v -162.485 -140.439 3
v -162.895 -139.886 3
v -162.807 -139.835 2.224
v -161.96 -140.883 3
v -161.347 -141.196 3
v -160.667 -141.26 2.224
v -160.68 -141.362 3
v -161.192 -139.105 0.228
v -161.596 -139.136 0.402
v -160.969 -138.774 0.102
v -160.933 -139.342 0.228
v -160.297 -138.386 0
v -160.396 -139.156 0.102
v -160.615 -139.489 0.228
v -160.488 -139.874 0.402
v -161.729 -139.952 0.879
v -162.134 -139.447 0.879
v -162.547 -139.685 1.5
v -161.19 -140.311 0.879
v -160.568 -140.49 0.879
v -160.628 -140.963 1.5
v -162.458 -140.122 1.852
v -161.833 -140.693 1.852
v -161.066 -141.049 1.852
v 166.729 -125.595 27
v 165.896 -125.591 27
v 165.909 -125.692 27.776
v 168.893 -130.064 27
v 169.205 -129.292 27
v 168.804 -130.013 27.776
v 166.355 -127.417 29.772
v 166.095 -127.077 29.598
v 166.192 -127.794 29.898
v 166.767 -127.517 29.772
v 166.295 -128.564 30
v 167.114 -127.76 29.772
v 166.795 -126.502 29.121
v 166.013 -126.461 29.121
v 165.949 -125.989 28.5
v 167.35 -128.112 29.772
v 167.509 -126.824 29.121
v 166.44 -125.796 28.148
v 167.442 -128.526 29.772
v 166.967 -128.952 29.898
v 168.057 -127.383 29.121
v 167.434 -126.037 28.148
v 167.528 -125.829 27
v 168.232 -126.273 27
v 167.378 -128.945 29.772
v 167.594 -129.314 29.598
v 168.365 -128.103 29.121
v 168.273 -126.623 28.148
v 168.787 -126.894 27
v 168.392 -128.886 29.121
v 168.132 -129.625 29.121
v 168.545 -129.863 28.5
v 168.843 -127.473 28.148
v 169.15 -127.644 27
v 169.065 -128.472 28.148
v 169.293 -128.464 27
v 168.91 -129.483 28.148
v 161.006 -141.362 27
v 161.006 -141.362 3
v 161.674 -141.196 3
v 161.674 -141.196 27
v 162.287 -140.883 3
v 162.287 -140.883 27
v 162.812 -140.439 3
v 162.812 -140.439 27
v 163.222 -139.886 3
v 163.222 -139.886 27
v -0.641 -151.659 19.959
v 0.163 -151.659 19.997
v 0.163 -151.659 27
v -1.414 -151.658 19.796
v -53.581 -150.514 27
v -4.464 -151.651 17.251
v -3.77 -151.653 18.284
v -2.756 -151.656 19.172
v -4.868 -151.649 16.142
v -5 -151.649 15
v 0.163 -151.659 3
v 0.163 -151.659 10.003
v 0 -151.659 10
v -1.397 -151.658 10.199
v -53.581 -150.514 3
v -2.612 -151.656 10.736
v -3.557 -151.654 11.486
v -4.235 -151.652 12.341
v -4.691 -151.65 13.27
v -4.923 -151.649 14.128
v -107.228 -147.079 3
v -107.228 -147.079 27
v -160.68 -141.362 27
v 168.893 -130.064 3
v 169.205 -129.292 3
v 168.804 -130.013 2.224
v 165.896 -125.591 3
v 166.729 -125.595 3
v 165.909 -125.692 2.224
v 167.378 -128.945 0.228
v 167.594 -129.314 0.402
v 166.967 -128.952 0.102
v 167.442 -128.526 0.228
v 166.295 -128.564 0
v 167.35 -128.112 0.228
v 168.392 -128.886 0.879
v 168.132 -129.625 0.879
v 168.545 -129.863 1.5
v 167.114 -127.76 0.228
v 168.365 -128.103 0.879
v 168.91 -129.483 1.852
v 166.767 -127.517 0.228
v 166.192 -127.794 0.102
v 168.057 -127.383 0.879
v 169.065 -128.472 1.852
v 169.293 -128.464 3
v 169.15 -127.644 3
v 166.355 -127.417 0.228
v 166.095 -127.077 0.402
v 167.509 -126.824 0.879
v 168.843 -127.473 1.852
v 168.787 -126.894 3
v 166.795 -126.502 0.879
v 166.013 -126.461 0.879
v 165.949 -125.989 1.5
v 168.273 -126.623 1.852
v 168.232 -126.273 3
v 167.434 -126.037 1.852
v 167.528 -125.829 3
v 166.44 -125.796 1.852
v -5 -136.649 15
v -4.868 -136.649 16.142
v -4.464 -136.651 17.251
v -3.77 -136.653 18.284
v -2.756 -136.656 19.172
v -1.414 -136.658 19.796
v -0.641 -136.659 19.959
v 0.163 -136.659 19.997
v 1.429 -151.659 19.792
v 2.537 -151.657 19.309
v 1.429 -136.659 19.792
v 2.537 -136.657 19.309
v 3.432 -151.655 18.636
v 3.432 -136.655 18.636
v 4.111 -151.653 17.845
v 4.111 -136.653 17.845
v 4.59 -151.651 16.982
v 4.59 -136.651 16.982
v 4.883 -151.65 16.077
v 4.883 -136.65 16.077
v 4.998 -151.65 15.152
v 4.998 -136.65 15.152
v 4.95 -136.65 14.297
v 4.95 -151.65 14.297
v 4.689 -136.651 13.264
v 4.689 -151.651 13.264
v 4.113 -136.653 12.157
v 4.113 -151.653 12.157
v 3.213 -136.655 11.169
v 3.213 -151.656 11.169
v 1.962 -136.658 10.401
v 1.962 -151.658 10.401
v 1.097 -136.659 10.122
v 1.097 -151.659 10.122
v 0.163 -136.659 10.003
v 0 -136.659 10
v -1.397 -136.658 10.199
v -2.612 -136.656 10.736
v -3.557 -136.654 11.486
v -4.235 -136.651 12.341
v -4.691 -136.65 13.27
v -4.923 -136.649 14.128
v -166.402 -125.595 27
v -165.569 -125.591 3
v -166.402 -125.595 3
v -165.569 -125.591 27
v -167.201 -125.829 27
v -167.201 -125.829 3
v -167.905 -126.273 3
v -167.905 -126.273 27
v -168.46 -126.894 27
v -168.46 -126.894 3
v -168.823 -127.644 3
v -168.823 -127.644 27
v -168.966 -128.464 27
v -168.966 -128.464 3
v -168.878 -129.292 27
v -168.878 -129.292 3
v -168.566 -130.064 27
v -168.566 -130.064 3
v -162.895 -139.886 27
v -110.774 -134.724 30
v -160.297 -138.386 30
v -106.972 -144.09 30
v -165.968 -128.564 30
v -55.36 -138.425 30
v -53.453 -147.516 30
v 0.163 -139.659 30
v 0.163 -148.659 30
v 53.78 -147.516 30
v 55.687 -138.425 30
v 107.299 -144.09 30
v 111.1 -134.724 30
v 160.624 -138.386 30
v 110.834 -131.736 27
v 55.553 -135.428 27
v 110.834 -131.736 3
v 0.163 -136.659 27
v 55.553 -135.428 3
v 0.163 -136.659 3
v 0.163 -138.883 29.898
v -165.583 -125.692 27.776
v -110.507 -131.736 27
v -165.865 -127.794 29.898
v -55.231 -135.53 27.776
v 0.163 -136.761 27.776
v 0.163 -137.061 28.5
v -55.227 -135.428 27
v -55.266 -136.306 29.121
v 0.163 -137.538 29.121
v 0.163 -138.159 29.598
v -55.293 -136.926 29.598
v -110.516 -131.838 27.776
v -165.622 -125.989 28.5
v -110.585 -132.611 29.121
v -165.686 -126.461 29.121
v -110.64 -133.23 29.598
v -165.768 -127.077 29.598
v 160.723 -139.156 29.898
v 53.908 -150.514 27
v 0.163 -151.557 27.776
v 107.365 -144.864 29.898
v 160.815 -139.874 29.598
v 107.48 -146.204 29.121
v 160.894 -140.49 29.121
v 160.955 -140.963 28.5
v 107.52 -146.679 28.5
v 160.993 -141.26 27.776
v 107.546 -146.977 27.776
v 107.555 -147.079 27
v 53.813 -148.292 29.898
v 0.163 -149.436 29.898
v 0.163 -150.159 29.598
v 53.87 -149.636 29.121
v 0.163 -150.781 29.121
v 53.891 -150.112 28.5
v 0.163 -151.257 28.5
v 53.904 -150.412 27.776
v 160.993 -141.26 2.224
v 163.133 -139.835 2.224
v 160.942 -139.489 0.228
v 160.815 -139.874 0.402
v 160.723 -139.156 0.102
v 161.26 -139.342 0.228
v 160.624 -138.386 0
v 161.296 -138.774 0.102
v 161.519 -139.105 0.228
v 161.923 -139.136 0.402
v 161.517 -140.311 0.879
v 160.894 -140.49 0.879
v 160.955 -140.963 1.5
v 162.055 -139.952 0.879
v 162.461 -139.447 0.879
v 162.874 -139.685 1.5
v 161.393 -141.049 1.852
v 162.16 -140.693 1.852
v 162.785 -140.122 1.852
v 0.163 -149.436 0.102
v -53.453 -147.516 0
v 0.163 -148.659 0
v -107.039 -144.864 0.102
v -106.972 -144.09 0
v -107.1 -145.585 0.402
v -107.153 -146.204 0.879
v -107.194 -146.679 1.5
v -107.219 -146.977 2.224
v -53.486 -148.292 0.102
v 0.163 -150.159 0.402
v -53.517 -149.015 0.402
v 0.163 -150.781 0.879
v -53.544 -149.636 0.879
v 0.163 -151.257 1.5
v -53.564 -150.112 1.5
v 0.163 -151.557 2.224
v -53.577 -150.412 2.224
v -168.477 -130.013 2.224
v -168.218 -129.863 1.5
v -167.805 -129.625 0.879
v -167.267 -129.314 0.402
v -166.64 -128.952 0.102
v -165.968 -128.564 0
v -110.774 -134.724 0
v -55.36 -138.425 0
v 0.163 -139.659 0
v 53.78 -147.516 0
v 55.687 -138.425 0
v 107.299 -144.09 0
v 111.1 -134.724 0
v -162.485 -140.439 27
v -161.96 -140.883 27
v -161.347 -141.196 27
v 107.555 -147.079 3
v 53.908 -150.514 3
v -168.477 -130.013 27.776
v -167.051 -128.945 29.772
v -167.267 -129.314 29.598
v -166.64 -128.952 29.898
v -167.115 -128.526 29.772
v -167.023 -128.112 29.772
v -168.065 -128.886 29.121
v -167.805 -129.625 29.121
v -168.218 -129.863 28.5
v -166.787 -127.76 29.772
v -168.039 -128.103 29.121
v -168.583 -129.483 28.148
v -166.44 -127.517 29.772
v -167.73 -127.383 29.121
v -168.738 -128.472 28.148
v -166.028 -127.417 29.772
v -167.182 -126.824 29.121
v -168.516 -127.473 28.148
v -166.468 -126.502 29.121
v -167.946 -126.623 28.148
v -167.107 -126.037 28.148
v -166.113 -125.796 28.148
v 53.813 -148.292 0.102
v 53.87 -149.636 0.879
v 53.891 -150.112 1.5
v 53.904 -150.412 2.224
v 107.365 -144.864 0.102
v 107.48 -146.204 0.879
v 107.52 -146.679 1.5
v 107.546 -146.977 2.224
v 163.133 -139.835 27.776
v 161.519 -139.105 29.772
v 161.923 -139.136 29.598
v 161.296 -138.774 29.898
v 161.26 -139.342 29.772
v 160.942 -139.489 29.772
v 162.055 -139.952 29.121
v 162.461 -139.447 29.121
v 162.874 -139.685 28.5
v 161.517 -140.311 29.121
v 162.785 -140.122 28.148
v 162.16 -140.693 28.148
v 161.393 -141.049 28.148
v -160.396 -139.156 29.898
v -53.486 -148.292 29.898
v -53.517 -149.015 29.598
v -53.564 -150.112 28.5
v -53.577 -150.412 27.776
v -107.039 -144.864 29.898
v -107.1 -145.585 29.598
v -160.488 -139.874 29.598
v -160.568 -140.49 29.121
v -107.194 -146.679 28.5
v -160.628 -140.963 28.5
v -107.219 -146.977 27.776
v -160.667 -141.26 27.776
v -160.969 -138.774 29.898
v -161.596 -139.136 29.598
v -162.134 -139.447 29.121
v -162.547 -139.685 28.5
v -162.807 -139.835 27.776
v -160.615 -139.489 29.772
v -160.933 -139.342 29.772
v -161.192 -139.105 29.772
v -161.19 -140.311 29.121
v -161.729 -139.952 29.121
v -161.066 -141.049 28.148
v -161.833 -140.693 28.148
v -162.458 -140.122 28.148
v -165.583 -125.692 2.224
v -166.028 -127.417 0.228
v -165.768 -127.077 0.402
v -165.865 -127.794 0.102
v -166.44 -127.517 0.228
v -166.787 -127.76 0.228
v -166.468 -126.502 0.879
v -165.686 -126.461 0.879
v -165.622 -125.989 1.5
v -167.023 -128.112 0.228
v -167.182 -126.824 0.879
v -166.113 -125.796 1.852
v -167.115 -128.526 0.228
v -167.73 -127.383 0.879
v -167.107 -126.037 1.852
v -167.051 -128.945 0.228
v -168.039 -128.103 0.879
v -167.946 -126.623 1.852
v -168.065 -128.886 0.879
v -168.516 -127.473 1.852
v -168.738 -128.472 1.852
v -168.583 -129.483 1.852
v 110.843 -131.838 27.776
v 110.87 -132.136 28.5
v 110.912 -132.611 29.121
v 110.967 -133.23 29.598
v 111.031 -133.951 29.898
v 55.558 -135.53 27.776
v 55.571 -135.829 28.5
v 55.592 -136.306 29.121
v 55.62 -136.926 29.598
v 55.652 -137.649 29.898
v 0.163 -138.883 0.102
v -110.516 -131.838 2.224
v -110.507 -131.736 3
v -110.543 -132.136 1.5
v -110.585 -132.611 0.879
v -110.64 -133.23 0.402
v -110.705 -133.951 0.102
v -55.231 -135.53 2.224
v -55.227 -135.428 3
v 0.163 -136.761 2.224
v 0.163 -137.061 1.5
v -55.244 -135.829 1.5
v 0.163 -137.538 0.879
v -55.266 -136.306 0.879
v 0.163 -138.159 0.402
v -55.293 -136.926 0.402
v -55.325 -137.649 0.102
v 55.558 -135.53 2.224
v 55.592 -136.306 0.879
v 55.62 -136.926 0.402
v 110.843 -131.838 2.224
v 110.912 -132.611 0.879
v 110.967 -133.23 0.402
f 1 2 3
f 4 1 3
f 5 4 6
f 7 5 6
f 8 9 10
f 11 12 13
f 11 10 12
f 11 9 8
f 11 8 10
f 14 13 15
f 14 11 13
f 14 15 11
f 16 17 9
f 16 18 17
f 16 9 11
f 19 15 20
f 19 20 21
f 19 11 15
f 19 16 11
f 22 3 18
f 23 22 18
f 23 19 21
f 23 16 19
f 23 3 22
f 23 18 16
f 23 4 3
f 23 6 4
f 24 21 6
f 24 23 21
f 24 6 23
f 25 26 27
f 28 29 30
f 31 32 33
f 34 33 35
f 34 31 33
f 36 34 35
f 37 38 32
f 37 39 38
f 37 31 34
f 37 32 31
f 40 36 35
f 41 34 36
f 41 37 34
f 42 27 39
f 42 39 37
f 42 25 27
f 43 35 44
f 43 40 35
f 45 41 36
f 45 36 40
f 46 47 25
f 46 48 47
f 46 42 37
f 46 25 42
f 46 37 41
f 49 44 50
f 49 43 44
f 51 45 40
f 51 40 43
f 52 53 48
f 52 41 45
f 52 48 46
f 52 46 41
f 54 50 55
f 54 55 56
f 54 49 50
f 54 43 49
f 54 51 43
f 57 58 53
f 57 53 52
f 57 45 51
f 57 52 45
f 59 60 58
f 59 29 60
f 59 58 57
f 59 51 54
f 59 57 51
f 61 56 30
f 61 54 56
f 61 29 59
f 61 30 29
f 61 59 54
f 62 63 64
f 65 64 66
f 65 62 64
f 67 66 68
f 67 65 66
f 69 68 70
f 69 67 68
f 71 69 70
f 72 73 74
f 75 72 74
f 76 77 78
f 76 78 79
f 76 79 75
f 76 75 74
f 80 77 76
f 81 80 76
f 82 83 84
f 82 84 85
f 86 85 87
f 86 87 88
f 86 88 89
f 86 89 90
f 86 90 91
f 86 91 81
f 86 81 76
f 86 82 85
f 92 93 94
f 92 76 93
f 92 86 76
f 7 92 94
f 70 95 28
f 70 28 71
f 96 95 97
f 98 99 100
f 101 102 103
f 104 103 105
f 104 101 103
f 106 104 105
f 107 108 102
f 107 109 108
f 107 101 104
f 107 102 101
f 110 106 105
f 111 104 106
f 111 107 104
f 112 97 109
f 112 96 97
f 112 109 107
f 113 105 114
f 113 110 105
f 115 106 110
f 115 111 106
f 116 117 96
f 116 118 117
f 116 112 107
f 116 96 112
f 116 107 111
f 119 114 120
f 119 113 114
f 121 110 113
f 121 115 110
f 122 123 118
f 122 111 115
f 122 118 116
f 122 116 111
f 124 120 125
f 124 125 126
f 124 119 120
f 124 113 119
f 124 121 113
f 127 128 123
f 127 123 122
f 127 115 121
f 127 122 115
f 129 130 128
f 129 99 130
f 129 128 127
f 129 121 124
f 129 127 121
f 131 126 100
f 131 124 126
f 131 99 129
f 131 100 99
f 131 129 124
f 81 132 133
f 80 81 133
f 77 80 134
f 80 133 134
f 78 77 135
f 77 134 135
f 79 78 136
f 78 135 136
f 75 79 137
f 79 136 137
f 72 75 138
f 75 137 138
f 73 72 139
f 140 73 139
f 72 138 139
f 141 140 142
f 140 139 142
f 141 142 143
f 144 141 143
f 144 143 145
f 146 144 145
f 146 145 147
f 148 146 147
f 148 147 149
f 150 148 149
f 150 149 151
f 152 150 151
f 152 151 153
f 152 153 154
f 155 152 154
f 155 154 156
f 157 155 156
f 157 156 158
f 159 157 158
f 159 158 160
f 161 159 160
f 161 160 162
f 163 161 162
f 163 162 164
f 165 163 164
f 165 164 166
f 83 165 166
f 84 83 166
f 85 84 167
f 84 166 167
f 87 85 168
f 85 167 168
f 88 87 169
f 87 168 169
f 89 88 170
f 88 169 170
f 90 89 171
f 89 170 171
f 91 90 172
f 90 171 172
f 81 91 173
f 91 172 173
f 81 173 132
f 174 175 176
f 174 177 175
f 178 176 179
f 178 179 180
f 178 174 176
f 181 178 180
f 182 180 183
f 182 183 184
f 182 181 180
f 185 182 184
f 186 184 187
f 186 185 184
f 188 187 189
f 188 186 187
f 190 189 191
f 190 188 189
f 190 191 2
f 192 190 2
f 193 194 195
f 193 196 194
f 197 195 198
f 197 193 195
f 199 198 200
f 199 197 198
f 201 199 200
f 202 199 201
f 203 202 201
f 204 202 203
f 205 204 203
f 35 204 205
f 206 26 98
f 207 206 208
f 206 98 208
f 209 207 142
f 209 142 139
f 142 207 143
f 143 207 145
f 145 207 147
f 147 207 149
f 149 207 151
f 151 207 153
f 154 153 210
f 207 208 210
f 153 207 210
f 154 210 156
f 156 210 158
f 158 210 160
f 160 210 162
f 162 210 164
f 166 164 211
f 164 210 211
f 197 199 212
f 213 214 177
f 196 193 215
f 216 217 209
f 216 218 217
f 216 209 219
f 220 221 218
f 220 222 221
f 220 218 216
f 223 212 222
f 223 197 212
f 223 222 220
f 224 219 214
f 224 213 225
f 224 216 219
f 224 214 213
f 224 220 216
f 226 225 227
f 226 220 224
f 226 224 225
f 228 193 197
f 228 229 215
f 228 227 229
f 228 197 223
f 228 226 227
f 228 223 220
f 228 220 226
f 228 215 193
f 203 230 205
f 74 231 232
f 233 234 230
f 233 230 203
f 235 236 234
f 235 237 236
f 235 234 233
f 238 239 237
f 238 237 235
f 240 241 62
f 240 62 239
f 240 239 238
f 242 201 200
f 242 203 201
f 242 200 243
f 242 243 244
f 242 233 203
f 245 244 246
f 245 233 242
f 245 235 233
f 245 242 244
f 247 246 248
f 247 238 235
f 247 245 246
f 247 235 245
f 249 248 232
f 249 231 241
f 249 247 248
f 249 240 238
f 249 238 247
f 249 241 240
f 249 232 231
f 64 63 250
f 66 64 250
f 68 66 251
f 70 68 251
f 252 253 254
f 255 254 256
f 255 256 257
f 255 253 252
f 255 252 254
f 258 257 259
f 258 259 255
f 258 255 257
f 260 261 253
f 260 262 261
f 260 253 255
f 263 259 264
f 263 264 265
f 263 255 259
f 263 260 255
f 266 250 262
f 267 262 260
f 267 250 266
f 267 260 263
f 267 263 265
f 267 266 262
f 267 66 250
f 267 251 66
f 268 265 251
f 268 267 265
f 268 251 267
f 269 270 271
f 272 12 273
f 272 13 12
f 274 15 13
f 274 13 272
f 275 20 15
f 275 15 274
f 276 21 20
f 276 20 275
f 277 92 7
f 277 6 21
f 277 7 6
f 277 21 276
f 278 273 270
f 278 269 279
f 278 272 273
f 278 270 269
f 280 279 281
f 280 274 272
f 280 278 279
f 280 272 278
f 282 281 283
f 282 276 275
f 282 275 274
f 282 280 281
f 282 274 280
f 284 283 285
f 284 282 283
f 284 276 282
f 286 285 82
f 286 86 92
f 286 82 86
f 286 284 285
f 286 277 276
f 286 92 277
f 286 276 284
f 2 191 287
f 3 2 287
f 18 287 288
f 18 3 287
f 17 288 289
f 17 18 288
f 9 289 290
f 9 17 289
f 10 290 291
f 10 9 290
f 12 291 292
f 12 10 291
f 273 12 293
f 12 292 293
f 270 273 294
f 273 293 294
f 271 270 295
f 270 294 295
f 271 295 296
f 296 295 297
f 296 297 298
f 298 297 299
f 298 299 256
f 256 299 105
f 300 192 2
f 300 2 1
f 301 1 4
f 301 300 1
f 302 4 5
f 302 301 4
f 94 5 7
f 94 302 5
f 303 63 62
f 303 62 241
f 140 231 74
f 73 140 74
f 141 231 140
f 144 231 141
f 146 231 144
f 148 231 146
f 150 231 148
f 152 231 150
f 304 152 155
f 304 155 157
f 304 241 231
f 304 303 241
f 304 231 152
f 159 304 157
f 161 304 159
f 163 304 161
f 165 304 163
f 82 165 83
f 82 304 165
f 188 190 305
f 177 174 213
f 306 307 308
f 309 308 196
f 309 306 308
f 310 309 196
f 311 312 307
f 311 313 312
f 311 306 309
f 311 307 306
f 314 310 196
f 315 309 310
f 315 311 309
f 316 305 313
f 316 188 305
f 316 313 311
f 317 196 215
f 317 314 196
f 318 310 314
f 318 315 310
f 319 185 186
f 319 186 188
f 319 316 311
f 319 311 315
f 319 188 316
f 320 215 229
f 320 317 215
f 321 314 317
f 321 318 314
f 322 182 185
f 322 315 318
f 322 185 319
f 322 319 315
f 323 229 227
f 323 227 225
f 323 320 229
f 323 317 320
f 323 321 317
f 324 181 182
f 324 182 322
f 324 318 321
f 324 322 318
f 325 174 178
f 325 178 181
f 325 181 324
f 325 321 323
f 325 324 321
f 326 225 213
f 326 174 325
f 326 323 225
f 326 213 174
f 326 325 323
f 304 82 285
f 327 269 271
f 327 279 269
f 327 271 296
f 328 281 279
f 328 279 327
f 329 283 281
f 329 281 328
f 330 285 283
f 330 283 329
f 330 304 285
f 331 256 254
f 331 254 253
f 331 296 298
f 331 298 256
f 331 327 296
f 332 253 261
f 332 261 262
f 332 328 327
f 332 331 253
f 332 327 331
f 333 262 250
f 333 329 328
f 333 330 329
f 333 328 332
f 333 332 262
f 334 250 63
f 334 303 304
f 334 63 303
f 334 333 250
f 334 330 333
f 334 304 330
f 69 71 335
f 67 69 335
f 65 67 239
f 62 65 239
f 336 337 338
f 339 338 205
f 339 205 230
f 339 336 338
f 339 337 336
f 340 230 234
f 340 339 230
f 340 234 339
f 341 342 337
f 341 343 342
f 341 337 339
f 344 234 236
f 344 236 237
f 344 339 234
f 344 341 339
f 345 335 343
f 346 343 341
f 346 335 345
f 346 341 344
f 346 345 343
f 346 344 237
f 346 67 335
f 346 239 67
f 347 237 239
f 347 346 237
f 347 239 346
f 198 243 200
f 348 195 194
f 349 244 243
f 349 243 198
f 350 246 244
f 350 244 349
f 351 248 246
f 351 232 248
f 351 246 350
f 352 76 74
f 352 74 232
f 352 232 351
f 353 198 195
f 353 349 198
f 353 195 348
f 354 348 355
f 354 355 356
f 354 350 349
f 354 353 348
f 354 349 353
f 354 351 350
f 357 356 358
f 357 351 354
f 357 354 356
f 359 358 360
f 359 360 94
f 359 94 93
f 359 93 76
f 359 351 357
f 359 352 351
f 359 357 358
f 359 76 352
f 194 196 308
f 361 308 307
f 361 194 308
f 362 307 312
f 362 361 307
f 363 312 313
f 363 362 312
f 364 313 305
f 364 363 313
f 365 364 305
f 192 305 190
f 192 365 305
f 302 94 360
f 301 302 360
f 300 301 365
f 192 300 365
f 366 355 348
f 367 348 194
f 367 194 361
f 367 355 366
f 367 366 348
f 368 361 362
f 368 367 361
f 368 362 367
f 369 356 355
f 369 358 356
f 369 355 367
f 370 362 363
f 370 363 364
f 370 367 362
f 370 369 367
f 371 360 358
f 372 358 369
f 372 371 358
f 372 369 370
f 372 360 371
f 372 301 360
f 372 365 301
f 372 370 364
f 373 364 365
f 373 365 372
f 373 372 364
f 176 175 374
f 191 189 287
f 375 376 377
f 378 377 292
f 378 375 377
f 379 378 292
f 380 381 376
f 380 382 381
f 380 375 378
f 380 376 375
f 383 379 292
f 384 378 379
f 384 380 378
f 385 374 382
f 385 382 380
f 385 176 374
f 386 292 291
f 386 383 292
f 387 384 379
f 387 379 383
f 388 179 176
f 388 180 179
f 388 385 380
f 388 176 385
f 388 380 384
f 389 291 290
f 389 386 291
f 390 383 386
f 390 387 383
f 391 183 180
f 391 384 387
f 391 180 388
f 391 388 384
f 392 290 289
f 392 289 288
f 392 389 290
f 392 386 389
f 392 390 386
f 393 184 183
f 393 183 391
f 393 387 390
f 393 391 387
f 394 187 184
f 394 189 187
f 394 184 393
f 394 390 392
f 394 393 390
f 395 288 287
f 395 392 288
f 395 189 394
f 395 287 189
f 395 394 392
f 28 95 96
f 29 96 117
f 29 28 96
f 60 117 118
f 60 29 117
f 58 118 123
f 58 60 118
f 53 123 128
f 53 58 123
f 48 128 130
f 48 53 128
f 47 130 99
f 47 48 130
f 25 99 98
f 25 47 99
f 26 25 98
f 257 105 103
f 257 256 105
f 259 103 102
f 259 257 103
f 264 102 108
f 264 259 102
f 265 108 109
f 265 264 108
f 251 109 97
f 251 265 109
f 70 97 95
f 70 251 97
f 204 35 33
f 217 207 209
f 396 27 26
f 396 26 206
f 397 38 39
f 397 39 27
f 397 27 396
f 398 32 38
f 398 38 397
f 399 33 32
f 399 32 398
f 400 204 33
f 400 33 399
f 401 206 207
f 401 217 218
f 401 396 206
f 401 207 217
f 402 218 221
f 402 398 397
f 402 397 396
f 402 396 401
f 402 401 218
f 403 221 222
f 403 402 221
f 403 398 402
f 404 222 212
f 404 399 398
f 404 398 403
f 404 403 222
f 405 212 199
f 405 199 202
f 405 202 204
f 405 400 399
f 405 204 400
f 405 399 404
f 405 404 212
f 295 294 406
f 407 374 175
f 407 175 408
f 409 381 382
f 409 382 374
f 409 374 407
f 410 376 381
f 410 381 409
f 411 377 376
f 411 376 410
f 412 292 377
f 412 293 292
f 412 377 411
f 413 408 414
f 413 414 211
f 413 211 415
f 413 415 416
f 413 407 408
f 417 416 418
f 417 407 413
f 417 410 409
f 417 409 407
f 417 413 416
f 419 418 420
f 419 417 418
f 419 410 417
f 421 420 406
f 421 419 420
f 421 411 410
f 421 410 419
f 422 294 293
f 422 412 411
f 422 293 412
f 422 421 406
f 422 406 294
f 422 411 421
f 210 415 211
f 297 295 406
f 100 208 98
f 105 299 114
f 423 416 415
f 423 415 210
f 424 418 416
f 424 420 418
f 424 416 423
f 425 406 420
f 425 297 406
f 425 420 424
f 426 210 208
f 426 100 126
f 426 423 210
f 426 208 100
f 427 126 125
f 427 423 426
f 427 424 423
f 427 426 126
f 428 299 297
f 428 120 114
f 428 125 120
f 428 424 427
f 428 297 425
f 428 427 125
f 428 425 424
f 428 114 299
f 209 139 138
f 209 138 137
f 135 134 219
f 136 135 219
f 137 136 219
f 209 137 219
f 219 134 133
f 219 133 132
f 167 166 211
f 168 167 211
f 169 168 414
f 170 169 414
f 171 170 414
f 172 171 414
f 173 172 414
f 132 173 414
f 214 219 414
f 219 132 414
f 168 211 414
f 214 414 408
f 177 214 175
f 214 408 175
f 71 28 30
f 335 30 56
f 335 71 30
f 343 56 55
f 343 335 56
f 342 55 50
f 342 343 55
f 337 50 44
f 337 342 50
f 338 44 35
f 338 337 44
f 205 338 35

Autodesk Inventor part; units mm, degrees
ref_plane "YZ Plane" through (0, 0, 0) normal (1, 0, 0) x (0, 1, 0)
ref_plane "XZ Plane" through (0, 0, 0) normal (0, 1, 0) x (-1, 0, 0)
ref_plane "XY Plane" through (0, 0, 0) normal (0, 0, 1) x (1, 0, 0)
sketch "Sketch1" plane through (0, 0, 0) normal (0, 0, 1) x (1, 0, 0)
  arc A0 (0.1634, -151.6592) -> (162.48, -141.1714) centre (0.1634, 1109.6463) ccw
  arc A1 (0.1634, -136.6592) -> (171.9535, -124.7627) centre (0.1634, 1109.6463) ccw
  line L0 (171.9535, -124.7627) -> (162.48, -141.1714)
  line L1 (171.9535, -124.7627) -> (190.9007, -124.7627) construction
  line L2 (0.1634, -151.6592) -> (0.1634, -124.7627)
  arc A2 (-162.1531, -141.1714) -> (0.1634, -151.6592) centre (0.1634, 1109.6463) ccw
  arc A3 (-171.6266, -124.7627) -> (0.1634, -136.6592) centre (0.1634, 1109.6463) ccw
  line L3 (-171.6266, -124.7627) -> (-162.1531, -141.1714)
  point P0 (0, 0)
  dimension "d0" = 15
  dimension "d1" = 120
extrude "Extrusion1" add sketch "Sketch1" along normal blind 30
fillet "Fillet1" radius 3 12 edges at (-85.9373, -133.6816, 30) (81.4909, -149.0346, 30) (167.2167, -132.9671, 30) (171.9535, -124.7627, 15) (162.48, -141.1714, 15) (167.2167, -132.9671, 0) (-166.8899, -132.9671, 30) (-171.6266, -124.7627, 15) (86.2642, -133.6816, 0) (81.4909, -149.0346, 0) (-162.1531, -141.1714, 15) (-166.8899, -132.9671, 0)
sketch "Sketch2" plane through (0, 0, 0) normal (0, 1, 0) x (-1, 0, 0)
  line L0 (0, 0) -> (0, 15)
  circle A0 centre (0, 15) radius 5
  dimension "d5" = 15
  dimension "d6" = 10
extrude "Extrusion2" cut sketch "Sketch2" against normal blind 300
properties part number "LEAF 6" material "Steel, Carbon"
